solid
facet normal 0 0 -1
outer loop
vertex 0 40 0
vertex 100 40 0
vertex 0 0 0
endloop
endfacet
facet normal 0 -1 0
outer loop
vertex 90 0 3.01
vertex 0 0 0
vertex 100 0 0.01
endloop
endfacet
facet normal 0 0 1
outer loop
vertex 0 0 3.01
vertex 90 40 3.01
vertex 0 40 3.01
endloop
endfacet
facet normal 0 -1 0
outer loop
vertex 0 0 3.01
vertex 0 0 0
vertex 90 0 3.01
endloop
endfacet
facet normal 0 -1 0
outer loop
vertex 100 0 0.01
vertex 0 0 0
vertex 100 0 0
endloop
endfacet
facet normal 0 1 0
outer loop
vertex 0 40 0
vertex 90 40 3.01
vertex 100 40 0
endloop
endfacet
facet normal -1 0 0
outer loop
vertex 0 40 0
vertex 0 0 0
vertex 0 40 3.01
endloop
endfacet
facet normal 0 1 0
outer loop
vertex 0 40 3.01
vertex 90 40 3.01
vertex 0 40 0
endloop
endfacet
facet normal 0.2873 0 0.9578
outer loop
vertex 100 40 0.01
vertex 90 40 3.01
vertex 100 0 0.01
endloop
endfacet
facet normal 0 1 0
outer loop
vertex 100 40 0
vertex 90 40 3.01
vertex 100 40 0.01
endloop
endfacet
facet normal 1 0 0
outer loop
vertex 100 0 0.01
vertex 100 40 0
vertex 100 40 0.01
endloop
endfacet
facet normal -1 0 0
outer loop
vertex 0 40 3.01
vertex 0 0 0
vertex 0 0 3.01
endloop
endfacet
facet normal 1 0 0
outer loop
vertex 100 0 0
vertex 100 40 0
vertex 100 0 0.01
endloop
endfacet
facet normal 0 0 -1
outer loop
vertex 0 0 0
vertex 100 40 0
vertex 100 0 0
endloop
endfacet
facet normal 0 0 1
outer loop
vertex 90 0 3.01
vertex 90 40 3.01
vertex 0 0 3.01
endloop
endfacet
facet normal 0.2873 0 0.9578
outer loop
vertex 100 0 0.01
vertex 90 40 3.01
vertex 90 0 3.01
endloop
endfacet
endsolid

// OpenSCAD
hull()
{
	cube([100,40,0.01]);
	translate([0,0,3]) cube([90,40,0.01]);
}
